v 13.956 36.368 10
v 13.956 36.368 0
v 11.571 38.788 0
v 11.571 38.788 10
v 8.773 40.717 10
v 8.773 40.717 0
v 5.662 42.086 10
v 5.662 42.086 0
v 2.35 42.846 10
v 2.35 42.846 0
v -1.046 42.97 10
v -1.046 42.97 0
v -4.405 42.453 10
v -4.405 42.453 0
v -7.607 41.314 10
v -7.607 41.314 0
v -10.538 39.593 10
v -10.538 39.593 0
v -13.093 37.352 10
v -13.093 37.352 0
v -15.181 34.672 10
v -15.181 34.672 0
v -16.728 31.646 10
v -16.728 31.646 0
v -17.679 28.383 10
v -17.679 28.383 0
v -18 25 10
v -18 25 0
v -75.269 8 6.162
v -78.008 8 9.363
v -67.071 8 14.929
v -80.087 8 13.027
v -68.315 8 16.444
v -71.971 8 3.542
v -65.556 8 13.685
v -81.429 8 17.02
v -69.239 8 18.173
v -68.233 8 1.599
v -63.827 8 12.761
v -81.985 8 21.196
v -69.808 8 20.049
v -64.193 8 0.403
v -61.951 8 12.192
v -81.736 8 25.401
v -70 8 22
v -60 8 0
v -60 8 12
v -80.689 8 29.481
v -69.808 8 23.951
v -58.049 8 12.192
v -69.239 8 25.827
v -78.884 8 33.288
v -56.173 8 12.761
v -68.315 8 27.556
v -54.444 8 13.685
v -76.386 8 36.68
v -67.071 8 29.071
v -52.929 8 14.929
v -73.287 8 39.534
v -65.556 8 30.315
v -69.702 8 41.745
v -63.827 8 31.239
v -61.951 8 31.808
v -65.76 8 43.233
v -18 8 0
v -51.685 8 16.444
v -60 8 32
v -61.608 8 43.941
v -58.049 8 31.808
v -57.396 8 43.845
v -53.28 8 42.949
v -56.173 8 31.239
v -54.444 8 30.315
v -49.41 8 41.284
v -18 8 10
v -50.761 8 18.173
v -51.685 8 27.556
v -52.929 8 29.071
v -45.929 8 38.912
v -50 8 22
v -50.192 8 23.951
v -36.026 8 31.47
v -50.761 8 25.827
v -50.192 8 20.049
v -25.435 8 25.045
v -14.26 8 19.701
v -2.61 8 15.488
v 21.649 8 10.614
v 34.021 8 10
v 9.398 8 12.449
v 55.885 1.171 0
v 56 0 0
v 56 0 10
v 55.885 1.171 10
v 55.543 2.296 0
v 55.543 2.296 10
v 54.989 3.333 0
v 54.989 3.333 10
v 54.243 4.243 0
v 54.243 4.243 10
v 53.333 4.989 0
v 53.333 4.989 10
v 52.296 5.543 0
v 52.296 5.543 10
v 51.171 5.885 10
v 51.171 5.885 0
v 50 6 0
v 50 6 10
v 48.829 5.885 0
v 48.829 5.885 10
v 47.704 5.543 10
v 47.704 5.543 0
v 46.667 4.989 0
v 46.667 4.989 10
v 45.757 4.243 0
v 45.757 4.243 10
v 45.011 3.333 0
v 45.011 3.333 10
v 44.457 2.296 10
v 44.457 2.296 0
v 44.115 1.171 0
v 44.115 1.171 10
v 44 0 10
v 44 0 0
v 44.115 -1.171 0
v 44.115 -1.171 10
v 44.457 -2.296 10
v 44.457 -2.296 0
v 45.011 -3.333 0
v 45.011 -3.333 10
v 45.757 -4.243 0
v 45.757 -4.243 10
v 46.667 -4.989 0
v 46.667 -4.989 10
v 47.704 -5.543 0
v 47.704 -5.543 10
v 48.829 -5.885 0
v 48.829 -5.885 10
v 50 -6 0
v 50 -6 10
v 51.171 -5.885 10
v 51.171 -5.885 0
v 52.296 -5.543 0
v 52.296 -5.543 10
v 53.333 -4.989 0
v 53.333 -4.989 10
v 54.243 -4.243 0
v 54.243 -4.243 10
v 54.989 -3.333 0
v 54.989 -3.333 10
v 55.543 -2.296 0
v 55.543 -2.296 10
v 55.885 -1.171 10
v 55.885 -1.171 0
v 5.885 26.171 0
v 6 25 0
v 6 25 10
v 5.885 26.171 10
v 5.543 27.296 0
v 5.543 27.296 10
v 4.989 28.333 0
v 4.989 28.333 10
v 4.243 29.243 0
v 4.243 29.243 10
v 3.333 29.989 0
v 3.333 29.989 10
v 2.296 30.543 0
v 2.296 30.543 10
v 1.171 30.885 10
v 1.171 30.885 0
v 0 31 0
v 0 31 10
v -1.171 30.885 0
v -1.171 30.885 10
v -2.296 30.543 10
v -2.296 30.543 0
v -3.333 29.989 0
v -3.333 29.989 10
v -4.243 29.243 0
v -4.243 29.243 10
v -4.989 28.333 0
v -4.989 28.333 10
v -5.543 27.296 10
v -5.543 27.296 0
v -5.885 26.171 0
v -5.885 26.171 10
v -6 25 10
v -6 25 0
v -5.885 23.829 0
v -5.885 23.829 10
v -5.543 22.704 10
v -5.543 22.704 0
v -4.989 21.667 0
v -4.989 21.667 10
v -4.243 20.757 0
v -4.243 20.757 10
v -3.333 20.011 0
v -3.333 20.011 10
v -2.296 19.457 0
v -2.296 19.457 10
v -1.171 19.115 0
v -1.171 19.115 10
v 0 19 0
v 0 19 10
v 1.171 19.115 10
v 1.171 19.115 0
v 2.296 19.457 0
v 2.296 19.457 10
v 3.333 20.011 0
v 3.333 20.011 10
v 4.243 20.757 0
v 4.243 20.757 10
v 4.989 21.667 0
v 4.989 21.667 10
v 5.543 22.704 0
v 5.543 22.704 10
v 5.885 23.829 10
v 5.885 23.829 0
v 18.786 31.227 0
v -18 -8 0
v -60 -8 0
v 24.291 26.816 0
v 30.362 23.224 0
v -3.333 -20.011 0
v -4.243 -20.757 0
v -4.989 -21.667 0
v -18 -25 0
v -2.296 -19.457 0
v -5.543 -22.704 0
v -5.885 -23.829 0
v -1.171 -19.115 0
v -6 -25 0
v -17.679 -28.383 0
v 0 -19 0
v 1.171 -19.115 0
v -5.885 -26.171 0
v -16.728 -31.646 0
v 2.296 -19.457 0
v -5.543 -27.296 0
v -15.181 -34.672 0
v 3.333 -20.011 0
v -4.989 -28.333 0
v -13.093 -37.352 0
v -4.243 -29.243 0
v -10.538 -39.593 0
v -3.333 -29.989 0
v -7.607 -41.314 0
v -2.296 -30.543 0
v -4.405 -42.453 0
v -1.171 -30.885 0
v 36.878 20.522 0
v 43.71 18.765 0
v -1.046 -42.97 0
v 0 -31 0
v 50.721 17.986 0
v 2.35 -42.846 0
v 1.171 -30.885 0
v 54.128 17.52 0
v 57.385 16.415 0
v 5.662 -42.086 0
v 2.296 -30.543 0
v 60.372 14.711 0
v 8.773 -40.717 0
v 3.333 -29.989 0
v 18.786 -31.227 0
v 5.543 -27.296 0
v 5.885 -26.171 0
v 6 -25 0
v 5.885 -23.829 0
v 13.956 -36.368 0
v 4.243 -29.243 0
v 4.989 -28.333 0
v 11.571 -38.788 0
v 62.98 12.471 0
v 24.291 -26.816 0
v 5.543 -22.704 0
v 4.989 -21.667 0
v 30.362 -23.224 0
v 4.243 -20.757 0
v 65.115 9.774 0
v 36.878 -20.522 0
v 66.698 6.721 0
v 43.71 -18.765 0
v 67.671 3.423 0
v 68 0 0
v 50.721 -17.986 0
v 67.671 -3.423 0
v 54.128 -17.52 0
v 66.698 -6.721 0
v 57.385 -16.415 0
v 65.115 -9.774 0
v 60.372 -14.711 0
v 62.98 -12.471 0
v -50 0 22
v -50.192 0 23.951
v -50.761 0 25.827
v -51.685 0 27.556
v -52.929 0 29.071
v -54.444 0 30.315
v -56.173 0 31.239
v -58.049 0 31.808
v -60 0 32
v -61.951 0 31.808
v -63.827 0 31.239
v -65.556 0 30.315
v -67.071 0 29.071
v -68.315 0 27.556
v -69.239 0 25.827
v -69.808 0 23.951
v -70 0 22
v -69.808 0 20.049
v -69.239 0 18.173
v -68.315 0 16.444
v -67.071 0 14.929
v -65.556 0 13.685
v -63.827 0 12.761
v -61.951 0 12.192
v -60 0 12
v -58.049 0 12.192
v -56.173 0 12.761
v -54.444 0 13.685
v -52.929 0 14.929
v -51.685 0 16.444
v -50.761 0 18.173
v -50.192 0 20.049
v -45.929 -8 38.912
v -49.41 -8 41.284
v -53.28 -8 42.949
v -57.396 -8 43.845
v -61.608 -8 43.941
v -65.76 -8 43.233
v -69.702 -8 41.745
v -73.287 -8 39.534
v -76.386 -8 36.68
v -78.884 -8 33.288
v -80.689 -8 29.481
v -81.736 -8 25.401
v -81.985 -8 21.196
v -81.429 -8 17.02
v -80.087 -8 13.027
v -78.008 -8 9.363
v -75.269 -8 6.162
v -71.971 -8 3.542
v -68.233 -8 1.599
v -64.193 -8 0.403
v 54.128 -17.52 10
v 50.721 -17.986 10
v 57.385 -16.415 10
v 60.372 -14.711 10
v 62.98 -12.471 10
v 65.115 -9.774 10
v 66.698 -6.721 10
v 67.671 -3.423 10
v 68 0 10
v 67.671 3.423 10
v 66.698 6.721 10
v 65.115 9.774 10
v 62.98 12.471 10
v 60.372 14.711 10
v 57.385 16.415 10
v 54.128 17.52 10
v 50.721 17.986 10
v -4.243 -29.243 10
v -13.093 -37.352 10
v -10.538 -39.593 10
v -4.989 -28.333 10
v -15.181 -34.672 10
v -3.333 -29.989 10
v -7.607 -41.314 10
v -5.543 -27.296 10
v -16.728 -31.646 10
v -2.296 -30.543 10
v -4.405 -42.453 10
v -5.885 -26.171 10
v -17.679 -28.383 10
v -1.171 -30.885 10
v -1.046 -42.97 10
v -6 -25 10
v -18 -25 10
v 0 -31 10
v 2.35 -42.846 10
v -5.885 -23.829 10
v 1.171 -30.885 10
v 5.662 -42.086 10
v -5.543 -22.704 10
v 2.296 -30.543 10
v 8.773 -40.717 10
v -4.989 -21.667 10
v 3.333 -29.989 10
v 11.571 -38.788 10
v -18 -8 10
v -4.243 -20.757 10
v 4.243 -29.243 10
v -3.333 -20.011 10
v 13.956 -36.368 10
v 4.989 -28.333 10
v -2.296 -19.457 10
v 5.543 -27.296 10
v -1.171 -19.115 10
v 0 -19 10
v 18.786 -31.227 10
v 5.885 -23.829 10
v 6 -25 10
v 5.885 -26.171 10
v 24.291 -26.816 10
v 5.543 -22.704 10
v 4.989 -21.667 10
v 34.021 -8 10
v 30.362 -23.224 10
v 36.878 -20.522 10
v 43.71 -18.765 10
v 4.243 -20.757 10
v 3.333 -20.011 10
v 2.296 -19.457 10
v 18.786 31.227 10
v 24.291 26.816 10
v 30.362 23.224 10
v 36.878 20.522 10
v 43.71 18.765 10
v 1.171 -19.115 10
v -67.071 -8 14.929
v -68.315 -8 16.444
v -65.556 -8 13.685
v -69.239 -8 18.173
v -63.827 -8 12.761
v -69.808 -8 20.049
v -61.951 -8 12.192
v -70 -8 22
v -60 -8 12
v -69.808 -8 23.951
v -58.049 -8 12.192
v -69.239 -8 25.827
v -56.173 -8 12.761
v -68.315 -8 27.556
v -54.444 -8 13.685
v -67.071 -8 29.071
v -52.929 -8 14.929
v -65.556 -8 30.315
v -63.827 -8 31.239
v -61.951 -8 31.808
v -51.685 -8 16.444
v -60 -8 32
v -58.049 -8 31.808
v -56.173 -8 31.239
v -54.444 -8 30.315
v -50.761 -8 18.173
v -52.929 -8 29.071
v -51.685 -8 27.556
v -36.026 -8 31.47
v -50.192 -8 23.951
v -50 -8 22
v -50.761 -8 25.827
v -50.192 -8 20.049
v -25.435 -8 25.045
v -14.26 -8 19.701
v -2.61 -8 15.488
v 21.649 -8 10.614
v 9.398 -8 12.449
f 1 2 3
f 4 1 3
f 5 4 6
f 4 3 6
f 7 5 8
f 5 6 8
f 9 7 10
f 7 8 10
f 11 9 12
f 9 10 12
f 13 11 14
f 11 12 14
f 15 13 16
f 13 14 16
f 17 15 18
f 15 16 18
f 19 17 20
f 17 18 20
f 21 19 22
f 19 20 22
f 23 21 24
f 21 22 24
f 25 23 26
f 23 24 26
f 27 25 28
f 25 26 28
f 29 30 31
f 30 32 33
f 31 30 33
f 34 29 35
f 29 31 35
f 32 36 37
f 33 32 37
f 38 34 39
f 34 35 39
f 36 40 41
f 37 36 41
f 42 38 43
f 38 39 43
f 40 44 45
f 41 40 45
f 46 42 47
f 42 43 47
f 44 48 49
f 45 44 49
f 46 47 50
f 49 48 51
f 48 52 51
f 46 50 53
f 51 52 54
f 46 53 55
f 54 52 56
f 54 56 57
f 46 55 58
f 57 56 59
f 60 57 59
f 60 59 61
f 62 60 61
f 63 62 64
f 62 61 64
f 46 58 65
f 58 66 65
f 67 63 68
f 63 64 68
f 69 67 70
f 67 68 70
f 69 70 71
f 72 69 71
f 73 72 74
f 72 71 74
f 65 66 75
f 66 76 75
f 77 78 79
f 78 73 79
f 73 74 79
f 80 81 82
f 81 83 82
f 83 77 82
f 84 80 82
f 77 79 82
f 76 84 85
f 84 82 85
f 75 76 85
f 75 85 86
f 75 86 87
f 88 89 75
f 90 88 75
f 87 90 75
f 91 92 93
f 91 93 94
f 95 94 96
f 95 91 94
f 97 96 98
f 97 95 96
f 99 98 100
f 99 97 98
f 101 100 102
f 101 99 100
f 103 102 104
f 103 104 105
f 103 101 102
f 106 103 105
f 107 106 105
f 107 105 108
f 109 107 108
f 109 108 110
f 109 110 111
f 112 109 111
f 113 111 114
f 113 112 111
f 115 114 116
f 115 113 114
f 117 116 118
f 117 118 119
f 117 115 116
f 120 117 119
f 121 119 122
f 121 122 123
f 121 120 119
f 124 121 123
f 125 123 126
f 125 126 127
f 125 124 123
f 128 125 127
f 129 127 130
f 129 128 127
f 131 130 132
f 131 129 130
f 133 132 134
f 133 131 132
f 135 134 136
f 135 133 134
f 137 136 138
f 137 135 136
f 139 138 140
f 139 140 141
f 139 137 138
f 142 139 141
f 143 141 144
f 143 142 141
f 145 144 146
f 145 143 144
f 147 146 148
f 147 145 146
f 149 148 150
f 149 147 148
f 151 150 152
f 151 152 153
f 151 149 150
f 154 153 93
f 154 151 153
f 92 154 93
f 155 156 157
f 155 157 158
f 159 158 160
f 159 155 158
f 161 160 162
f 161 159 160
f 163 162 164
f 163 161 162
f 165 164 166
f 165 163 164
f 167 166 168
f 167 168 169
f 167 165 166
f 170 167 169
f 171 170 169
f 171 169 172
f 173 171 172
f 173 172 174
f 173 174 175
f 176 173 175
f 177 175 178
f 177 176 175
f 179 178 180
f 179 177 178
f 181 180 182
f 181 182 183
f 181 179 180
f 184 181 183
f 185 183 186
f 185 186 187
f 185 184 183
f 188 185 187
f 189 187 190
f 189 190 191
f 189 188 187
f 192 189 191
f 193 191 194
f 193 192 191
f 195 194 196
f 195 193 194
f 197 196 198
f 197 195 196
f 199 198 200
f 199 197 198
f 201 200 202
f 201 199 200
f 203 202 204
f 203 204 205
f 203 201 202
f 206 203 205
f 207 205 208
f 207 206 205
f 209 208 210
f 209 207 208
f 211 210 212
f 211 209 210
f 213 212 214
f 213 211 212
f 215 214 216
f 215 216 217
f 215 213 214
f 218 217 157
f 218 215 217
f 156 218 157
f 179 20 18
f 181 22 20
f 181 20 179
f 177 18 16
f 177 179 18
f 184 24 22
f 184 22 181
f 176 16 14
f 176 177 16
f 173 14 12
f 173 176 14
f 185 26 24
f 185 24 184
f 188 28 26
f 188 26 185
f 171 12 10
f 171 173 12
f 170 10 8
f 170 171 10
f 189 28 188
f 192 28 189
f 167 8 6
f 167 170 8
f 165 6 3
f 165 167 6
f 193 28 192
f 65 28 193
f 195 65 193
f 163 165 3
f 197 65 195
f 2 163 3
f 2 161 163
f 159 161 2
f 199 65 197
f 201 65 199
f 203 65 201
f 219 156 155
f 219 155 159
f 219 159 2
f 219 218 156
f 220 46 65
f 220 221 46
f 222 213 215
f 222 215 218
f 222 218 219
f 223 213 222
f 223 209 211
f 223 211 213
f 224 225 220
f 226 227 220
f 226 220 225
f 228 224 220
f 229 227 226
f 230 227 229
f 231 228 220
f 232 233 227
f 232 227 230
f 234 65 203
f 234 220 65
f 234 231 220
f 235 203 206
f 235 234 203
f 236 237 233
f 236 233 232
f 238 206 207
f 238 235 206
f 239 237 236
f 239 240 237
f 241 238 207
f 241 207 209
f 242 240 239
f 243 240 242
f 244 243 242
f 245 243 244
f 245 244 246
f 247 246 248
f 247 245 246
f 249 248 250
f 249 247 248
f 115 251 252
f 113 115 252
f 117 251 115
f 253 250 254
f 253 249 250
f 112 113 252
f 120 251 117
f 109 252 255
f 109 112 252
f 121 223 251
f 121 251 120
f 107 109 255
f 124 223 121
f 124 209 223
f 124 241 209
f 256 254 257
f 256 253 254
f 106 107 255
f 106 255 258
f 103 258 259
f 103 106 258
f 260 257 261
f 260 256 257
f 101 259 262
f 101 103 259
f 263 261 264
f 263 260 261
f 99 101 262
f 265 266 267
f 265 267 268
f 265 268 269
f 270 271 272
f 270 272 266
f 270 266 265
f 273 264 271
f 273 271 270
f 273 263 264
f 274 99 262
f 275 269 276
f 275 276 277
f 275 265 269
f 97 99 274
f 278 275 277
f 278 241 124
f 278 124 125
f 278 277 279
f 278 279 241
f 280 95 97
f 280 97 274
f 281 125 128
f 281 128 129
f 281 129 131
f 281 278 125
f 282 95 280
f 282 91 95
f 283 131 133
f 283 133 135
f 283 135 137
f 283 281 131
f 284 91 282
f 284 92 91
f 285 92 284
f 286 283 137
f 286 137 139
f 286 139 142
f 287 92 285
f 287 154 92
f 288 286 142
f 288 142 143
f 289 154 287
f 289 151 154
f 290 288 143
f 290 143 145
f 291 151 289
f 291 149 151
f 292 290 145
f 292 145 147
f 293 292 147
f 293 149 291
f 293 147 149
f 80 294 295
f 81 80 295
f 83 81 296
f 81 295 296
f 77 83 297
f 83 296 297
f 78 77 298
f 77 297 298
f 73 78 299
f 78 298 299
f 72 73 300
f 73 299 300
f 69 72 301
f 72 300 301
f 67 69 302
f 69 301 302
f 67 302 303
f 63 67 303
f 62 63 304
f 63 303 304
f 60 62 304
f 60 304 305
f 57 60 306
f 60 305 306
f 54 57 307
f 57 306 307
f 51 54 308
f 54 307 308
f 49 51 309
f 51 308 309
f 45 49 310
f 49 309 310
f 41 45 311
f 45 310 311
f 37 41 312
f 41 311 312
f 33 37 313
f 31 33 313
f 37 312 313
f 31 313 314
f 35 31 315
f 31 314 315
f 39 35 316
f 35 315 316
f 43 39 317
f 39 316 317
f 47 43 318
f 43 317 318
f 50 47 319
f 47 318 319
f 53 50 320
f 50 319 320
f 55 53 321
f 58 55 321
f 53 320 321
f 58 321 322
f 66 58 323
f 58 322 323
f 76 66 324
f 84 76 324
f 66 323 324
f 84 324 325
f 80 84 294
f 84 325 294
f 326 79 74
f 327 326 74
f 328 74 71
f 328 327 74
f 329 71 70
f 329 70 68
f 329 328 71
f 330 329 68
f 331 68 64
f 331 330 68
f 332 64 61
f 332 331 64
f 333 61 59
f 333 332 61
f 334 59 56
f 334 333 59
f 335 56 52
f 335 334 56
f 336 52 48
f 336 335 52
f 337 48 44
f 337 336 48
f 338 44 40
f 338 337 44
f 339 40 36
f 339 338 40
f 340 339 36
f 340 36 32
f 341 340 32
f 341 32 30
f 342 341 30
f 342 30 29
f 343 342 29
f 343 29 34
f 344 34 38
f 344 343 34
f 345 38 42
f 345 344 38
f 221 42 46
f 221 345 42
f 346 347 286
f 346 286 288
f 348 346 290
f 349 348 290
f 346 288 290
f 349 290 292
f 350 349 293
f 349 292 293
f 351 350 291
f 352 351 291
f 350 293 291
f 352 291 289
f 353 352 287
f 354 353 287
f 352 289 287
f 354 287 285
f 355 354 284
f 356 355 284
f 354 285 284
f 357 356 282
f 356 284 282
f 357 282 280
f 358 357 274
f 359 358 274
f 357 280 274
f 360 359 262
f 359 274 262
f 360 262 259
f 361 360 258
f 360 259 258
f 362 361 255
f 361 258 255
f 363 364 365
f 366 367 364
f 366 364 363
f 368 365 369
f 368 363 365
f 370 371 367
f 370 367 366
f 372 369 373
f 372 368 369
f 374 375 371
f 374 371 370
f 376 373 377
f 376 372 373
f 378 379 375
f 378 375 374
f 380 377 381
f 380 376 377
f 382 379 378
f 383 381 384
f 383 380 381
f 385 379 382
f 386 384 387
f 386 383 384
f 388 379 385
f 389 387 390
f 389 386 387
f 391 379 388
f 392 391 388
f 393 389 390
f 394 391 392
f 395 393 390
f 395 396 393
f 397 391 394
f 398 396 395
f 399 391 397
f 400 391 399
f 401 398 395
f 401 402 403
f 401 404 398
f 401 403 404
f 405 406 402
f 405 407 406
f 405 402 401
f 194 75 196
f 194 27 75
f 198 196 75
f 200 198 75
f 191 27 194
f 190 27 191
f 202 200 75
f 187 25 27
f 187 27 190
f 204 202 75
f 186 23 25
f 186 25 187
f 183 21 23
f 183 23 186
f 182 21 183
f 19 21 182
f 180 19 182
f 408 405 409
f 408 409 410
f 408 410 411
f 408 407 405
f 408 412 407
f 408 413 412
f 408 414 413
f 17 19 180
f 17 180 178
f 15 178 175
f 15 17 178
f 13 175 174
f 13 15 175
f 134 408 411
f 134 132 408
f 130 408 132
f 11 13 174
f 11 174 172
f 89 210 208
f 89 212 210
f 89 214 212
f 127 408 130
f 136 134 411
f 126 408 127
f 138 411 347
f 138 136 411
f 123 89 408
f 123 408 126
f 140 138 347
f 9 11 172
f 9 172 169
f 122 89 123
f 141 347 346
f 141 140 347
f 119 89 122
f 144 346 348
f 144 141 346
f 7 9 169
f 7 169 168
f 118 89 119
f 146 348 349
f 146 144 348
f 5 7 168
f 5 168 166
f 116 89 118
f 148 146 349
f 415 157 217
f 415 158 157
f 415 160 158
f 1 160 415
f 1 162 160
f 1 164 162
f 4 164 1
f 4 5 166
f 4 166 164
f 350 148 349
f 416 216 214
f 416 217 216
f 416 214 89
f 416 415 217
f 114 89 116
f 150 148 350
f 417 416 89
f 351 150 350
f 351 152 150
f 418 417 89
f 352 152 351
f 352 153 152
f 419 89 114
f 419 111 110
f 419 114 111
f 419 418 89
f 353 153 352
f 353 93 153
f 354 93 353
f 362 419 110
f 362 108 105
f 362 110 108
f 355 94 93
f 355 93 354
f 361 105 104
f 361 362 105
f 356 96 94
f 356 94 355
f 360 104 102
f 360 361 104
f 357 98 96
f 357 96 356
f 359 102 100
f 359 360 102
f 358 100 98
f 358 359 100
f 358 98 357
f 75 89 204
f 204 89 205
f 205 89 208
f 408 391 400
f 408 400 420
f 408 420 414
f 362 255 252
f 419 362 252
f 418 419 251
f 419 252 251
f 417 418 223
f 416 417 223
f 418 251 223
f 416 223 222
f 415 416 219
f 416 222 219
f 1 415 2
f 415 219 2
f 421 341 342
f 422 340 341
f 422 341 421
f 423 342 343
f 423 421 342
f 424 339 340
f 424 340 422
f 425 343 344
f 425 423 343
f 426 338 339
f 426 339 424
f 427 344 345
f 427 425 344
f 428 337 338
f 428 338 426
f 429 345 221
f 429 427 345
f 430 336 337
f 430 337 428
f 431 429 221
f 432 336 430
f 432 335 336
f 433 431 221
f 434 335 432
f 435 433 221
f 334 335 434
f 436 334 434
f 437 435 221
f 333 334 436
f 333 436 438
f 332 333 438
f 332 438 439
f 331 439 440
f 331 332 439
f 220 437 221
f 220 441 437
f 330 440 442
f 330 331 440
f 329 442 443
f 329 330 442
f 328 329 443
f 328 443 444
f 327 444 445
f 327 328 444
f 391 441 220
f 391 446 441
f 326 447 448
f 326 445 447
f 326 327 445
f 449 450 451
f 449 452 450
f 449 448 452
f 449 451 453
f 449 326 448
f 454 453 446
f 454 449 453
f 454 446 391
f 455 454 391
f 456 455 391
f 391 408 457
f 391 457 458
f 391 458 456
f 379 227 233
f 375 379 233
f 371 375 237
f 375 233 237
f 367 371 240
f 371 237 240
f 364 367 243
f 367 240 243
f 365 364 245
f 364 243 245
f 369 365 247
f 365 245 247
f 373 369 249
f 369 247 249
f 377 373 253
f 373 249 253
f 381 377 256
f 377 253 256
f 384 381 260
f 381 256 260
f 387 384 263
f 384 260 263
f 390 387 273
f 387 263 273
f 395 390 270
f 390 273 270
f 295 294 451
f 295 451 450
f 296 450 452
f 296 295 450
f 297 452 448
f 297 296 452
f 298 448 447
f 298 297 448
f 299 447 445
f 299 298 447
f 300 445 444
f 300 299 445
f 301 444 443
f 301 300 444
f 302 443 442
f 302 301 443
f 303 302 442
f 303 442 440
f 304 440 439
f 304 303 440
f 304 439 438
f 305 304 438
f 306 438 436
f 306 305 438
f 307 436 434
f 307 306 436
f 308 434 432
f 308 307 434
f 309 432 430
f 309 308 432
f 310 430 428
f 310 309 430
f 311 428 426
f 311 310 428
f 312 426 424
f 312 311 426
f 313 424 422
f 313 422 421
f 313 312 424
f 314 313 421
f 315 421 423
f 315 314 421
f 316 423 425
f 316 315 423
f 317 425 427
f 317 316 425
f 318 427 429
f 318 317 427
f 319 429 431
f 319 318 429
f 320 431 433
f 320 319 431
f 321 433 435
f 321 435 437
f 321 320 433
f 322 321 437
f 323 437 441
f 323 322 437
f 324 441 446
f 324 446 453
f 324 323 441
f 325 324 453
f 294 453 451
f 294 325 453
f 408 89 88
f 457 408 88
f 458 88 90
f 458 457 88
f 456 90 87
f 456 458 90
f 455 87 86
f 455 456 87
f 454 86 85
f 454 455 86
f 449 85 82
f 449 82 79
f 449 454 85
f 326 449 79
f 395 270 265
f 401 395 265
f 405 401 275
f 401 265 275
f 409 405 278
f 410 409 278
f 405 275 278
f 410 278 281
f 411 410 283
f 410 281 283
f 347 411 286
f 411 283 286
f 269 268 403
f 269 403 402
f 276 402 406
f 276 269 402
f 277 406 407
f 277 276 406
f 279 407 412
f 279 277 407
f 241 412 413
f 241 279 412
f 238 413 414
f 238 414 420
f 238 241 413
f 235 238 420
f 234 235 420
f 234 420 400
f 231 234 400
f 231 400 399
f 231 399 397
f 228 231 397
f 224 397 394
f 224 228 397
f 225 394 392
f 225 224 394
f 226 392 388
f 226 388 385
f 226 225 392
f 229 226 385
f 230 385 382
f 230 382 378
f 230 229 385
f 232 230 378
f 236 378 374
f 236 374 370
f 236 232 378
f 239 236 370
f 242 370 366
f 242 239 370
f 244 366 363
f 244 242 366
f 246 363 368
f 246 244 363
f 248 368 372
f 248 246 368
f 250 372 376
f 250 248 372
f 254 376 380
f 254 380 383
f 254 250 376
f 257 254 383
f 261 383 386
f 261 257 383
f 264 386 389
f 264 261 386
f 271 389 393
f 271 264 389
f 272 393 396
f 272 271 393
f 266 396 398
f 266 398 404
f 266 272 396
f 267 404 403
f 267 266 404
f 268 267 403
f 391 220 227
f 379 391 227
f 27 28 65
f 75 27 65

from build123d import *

# Parameters (mm, degrees)
F0_R     = 6
F1_DEPTH = 10
F2_R     = 10
F3_DEPTH = 8
F4_DEPTH = 8


with BuildPart() as f1:
    # F0 (on Top) → F1 (new body)
    with BuildSketch(Plane.XY):
        with BuildLine():
            ThreePointArc((50.720724, -17.985565), (68, 0), (50.720724, 17.985565))
            ThreePointArc((50.720724, 17.985565), (30.362055, 23.224109), (13.956018, 36.367918))
            ThreePointArc((13.956018, 36.367918), (-6.032896, 41.958896), (-18, 25))
            Line((-18, 25), (-18, -25))
            ThreePointArc((-18, -25), (-6.032896, -41.958896), (13.956018, -36.367918))
            ThreePointArc((13.956018, -36.367918), (30.362055, -23.224109), (50.720724, -17.985565))
        make_face()
        with Locations((0, -25)):
            Circle(F0_R, mode=Mode.SUBTRACT)
        with Locations((0, 25)):
            Circle(F0_R, mode=Mode.SUBTRACT)
        with Locations((50, 0)):
            Circle(F0_R, mode=Mode.SUBTRACT)
    extrude(amount=F1_DEPTH)

    # F2 (on Front) → F3 (join)
    with BuildSketch(Plane.XZ):
        with BuildLine():
            ThreePointArc((-45.928789, 38.911565), (-80.688818, 29.481496), (-60, 0))
            Line((-60, 0), (34.021274, 0))
            Line((34.021274, 0), (34.021274, 10))
            ThreePointArc((34.021274, 10), (-8.487228, 17.449895), (-45.928789, 38.911565))
        make_face()
        with Locations((-60, 22)):
            Circle(F2_R, mode=Mode.SUBTRACT)
    extrude(amount=F3_DEPTH)

    # F2 (on Front) → F4 (join)
    with BuildSketch(Plane.XZ):
        with BuildLine():
            ThreePointArc((-45.928789, 38.911565), (-80.688818, 29.481496), (-60, 0))
            Line((-60, 0), (34.021274, 0))
            Line((34.021274, 0), (34.021274, 10))
            ThreePointArc((34.021274, 10), (-8.487228, 17.449895), (-45.928789, 38.911565))
        make_face()
        with Locations((-60, 22)):
            Circle(F2_R, mode=Mode.SUBTRACT)
    extrude(amount=-F4_DEPTH)


solid = f1.part
